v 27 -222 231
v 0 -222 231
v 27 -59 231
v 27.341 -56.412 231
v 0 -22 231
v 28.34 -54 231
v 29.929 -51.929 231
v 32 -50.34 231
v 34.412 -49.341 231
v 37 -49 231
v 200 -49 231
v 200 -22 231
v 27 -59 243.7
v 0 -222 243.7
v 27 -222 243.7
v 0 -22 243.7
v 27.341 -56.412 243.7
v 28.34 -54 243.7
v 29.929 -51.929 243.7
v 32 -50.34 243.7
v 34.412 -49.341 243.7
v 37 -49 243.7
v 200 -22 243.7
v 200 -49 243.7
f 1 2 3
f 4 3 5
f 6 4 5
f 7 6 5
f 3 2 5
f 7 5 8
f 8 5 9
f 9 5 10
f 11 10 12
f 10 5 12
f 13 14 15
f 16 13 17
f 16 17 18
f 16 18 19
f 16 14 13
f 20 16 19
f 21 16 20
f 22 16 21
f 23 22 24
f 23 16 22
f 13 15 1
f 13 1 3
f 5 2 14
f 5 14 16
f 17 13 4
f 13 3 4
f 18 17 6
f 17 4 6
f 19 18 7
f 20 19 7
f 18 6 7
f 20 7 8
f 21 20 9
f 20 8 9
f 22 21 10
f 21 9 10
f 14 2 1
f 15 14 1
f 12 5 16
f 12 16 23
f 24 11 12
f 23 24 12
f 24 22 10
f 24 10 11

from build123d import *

# Parameters (mm, degrees)
SKETCH014_W     = 200
SKETCH014_H     = 200
PAD007_DEPTH    = 12.7
SKETCH015_W     = 329.815369
SKETCH015_H     = 292.155731
POCKET002_DEPTH = 13
FILLET_R        = 10


with BuildPart() as part:
    # Sketch014 → Pad007 (new body)
    with BuildSketch(Plane.XY):
        with Locations((100, -100)):
            Rectangle(SKETCH014_W, SKETCH014_H)
    extrude(amount=PAD007_DEPTH)

    # Sketch015 (on Face6 of Pad007) → Pocket002 (cut)
    with BuildSketch(Plane.XY.offset(12.7)):
        with Locations((191.907684, -173.077866)):
            Rectangle(SKETCH015_W, SKETCH015_H)
    extrude(amount=-POCKET002_DEPTH, mode=Mode.SUBTRACT)

    # Fillet
    fillet_edges = [part.edges().sort_by_distance(p)[0] for p in [
        (27, -27, 6.35),
    ]]
    fillet(fillet_edges, radius=FILLET_R)


with BuildPart() as part_1:
    # Body008 placement: moved
    add(part.part.moved(Location((0, -22, 231))))


solid = part_1.part
